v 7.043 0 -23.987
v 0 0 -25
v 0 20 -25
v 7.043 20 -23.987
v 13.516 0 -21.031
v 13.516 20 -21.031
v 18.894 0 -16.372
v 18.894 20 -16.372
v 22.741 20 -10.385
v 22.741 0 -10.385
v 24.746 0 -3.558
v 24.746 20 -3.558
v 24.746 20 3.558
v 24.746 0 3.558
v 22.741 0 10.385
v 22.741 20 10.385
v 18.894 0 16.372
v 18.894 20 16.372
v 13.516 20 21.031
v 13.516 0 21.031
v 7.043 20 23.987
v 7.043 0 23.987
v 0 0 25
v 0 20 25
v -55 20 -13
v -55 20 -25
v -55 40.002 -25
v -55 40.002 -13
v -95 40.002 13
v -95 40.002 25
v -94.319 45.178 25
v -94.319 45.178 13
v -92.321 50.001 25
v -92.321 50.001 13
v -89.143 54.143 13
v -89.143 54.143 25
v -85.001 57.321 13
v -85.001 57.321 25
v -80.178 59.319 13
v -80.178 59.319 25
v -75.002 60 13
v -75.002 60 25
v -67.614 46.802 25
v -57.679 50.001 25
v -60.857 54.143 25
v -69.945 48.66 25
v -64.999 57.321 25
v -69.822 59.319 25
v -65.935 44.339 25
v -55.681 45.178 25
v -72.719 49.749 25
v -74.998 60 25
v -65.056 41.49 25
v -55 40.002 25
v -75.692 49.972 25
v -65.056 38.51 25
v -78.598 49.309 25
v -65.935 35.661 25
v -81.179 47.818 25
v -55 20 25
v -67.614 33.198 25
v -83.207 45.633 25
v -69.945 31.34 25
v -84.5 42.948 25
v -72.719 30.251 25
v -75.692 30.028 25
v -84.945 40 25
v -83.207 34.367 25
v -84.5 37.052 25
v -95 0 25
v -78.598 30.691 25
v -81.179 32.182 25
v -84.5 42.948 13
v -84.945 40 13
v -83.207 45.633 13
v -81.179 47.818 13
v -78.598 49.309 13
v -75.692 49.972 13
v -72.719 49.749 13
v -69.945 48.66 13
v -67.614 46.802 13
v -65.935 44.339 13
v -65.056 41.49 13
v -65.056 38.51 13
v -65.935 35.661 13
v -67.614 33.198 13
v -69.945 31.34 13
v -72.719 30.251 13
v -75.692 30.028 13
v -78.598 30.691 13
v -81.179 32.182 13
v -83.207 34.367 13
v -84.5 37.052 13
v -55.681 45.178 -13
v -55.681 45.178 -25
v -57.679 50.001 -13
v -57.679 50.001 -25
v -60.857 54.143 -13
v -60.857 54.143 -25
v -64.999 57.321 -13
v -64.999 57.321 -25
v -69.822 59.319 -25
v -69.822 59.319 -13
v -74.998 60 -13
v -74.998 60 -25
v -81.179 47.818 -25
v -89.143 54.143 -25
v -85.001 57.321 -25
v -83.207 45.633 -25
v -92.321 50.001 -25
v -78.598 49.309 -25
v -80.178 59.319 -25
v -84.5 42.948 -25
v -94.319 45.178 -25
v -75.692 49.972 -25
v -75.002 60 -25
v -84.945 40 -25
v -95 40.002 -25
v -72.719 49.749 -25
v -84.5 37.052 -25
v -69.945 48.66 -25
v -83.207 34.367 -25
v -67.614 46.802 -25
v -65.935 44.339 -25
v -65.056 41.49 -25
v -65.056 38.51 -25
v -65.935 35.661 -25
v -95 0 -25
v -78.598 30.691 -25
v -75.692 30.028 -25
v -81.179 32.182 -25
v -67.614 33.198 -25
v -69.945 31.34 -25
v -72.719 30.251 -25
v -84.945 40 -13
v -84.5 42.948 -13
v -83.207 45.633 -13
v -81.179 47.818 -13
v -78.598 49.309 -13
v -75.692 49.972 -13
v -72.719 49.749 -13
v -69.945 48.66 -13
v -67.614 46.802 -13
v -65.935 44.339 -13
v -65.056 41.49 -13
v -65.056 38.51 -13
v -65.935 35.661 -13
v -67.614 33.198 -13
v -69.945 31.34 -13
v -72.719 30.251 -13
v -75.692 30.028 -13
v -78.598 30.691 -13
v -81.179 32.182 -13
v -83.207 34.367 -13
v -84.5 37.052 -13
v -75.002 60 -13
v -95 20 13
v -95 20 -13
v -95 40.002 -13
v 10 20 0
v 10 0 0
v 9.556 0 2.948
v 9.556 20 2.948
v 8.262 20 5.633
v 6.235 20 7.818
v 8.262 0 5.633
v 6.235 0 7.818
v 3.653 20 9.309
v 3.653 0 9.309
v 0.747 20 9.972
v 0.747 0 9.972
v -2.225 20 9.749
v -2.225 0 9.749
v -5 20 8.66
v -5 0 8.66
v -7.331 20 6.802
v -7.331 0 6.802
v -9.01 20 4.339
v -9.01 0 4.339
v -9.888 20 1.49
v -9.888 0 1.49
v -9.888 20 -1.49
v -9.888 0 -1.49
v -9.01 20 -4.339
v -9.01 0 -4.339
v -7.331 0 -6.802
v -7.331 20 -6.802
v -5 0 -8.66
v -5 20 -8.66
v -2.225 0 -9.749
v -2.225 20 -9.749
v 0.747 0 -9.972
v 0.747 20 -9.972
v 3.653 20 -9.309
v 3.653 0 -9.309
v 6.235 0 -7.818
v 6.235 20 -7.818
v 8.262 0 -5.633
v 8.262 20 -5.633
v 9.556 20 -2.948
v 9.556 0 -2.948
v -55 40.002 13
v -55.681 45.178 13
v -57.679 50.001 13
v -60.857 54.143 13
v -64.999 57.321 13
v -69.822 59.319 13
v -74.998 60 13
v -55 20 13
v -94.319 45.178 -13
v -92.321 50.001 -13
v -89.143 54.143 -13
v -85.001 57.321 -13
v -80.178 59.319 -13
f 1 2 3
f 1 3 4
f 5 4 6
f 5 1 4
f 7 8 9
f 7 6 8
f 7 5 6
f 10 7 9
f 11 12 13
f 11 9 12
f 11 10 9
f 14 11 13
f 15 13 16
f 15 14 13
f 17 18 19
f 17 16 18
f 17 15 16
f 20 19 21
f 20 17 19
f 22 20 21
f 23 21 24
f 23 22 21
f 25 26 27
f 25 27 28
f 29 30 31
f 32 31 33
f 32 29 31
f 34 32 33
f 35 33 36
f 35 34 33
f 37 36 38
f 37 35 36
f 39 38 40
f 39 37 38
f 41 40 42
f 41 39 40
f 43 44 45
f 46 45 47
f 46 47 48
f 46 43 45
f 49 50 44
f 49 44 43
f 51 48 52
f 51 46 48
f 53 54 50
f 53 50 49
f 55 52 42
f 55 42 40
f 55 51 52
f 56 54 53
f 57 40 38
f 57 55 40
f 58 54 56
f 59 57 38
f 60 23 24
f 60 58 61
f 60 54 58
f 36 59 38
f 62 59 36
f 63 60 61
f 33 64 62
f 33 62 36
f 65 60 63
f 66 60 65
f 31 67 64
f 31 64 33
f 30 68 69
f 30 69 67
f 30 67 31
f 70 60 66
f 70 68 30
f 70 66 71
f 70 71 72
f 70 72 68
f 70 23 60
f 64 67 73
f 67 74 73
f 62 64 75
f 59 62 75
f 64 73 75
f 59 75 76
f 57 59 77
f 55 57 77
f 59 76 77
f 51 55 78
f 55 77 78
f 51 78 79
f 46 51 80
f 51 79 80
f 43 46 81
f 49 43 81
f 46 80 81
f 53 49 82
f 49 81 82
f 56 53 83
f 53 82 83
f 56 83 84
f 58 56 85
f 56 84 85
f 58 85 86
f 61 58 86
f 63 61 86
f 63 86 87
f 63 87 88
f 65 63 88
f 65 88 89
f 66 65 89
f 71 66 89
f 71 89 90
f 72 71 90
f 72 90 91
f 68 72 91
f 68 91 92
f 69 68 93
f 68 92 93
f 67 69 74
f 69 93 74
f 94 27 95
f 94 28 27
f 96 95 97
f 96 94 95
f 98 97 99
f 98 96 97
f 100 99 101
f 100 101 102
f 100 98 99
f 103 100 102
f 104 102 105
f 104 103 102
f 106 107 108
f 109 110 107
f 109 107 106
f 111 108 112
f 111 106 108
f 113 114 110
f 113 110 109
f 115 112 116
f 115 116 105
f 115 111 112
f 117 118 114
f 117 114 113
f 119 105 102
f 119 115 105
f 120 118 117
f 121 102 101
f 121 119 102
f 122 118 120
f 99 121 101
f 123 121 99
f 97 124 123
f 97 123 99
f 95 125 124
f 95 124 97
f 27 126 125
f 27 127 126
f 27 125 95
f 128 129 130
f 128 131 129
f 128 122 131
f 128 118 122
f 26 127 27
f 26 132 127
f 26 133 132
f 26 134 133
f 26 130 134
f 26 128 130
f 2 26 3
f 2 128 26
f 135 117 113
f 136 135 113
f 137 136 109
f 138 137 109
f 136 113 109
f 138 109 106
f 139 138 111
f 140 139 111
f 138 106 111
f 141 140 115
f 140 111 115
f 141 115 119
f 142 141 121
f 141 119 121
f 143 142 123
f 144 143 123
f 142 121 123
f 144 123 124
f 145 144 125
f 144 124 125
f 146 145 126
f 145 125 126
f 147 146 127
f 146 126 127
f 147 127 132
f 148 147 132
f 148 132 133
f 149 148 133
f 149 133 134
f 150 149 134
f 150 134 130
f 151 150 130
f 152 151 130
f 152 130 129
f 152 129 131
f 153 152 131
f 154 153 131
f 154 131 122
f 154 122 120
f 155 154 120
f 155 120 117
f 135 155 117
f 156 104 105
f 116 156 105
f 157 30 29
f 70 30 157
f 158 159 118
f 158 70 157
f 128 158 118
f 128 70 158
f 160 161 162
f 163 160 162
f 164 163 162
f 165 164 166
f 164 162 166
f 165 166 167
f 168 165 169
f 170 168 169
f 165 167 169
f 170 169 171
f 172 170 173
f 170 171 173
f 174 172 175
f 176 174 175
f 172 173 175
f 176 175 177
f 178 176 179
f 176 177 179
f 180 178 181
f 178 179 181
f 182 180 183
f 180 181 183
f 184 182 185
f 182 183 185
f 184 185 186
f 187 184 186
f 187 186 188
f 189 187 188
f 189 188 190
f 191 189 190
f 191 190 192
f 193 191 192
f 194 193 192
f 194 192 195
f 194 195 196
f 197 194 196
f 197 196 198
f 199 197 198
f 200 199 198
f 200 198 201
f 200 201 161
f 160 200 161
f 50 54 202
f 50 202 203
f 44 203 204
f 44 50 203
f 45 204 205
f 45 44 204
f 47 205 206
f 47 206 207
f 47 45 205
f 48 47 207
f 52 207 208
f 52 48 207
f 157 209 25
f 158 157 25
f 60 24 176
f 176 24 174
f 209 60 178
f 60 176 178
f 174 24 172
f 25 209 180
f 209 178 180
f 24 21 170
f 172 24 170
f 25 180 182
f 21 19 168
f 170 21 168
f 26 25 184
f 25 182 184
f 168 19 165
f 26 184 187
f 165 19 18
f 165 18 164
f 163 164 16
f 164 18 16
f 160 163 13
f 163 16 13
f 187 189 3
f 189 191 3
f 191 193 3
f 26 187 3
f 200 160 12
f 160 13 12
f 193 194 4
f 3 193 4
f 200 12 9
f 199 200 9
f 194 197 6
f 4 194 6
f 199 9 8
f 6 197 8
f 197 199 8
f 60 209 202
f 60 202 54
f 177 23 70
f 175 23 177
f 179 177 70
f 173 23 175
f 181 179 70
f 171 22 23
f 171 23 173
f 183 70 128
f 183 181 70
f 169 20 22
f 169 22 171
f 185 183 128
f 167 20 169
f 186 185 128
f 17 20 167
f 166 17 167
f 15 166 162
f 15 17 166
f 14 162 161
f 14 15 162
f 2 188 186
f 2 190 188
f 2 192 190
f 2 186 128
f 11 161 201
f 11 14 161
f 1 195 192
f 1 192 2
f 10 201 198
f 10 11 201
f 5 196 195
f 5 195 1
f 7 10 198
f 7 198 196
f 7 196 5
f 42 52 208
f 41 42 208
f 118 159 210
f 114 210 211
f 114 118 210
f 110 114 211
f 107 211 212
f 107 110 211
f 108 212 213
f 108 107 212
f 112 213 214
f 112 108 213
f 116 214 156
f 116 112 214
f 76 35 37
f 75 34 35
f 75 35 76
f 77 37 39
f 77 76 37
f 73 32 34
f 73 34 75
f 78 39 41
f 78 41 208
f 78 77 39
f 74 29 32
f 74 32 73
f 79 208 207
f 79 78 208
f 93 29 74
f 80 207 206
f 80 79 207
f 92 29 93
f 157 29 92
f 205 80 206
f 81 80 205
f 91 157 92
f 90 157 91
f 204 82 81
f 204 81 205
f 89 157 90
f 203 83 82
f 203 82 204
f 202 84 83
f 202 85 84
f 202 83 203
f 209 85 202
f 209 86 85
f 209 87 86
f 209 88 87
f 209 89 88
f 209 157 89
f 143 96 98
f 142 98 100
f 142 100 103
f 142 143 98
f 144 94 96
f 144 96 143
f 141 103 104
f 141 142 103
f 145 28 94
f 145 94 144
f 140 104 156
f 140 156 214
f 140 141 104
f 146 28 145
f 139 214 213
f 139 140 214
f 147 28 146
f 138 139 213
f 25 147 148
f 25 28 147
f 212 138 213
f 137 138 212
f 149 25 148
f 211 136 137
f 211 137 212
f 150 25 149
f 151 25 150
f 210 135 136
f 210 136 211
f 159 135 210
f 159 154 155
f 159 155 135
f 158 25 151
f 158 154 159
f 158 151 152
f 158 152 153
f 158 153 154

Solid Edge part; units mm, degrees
sketch "Sketch1" plane through (0, 0, 0) normal (0, -1, 0) x (1, 0, 0)
  line L0 (-55, -25) -> (0, -25)
  line L1 (-55, -13) -> (-55, -25)
  line L2 (-95, -13) -> (-55, -13)
  line L3 (-95, 13) -> (-95, -13)
  line L4 (-55, 13) -> (-95, 13)
  line L5 (-55, 25) -> (-55, 13)
  line L6 (0, 25) -> (-55, 25)
  arc A0 (0, 25) -> (0, -25) centre (0, 0) cw
  circle A1 centre (0, 0) radius 10
extrude "Protrusion1" add sketch "Sketch1" against normal blind 20
sketch "Sketch2" plane through (0, 0, 0) normal (0, -1, 0) x (1, 0, 0)
  line L0 (-95, -25) -> (-55, -25)
  line L1 (-55, -25) -> (-55, -13)
  line L2 (-55, -13) -> (-95, -13)
  line L3 (-95, -13) -> (-95, -25)
  line L4 (-95, 13) -> (-55, 13)
  line L5 (-55, 13) -> (-55, 25)
  line L6 (-55, 25) -> (-95, 25)
  line L7 (-95, 25) -> (-95, 13)
extrude "ExtrudedProtrusion_5" add sketch "Sketch2" against normal blind 60
fillet "Round_2" radius 20 4 edges at (-55, 60, -19) (-95, 60, -19) (-55, 60, 19) (-95, 60, 19)
sketch "Sketch3" plane through (-47.5, 30, -25) normal (0, 0, -1) x (-1, 0, 0)
  circle A0 centre (27.4446, 10) radius 10
extrude "ExtrudedCutout_1" cut sketch "Sketch3" against normal blind 50
